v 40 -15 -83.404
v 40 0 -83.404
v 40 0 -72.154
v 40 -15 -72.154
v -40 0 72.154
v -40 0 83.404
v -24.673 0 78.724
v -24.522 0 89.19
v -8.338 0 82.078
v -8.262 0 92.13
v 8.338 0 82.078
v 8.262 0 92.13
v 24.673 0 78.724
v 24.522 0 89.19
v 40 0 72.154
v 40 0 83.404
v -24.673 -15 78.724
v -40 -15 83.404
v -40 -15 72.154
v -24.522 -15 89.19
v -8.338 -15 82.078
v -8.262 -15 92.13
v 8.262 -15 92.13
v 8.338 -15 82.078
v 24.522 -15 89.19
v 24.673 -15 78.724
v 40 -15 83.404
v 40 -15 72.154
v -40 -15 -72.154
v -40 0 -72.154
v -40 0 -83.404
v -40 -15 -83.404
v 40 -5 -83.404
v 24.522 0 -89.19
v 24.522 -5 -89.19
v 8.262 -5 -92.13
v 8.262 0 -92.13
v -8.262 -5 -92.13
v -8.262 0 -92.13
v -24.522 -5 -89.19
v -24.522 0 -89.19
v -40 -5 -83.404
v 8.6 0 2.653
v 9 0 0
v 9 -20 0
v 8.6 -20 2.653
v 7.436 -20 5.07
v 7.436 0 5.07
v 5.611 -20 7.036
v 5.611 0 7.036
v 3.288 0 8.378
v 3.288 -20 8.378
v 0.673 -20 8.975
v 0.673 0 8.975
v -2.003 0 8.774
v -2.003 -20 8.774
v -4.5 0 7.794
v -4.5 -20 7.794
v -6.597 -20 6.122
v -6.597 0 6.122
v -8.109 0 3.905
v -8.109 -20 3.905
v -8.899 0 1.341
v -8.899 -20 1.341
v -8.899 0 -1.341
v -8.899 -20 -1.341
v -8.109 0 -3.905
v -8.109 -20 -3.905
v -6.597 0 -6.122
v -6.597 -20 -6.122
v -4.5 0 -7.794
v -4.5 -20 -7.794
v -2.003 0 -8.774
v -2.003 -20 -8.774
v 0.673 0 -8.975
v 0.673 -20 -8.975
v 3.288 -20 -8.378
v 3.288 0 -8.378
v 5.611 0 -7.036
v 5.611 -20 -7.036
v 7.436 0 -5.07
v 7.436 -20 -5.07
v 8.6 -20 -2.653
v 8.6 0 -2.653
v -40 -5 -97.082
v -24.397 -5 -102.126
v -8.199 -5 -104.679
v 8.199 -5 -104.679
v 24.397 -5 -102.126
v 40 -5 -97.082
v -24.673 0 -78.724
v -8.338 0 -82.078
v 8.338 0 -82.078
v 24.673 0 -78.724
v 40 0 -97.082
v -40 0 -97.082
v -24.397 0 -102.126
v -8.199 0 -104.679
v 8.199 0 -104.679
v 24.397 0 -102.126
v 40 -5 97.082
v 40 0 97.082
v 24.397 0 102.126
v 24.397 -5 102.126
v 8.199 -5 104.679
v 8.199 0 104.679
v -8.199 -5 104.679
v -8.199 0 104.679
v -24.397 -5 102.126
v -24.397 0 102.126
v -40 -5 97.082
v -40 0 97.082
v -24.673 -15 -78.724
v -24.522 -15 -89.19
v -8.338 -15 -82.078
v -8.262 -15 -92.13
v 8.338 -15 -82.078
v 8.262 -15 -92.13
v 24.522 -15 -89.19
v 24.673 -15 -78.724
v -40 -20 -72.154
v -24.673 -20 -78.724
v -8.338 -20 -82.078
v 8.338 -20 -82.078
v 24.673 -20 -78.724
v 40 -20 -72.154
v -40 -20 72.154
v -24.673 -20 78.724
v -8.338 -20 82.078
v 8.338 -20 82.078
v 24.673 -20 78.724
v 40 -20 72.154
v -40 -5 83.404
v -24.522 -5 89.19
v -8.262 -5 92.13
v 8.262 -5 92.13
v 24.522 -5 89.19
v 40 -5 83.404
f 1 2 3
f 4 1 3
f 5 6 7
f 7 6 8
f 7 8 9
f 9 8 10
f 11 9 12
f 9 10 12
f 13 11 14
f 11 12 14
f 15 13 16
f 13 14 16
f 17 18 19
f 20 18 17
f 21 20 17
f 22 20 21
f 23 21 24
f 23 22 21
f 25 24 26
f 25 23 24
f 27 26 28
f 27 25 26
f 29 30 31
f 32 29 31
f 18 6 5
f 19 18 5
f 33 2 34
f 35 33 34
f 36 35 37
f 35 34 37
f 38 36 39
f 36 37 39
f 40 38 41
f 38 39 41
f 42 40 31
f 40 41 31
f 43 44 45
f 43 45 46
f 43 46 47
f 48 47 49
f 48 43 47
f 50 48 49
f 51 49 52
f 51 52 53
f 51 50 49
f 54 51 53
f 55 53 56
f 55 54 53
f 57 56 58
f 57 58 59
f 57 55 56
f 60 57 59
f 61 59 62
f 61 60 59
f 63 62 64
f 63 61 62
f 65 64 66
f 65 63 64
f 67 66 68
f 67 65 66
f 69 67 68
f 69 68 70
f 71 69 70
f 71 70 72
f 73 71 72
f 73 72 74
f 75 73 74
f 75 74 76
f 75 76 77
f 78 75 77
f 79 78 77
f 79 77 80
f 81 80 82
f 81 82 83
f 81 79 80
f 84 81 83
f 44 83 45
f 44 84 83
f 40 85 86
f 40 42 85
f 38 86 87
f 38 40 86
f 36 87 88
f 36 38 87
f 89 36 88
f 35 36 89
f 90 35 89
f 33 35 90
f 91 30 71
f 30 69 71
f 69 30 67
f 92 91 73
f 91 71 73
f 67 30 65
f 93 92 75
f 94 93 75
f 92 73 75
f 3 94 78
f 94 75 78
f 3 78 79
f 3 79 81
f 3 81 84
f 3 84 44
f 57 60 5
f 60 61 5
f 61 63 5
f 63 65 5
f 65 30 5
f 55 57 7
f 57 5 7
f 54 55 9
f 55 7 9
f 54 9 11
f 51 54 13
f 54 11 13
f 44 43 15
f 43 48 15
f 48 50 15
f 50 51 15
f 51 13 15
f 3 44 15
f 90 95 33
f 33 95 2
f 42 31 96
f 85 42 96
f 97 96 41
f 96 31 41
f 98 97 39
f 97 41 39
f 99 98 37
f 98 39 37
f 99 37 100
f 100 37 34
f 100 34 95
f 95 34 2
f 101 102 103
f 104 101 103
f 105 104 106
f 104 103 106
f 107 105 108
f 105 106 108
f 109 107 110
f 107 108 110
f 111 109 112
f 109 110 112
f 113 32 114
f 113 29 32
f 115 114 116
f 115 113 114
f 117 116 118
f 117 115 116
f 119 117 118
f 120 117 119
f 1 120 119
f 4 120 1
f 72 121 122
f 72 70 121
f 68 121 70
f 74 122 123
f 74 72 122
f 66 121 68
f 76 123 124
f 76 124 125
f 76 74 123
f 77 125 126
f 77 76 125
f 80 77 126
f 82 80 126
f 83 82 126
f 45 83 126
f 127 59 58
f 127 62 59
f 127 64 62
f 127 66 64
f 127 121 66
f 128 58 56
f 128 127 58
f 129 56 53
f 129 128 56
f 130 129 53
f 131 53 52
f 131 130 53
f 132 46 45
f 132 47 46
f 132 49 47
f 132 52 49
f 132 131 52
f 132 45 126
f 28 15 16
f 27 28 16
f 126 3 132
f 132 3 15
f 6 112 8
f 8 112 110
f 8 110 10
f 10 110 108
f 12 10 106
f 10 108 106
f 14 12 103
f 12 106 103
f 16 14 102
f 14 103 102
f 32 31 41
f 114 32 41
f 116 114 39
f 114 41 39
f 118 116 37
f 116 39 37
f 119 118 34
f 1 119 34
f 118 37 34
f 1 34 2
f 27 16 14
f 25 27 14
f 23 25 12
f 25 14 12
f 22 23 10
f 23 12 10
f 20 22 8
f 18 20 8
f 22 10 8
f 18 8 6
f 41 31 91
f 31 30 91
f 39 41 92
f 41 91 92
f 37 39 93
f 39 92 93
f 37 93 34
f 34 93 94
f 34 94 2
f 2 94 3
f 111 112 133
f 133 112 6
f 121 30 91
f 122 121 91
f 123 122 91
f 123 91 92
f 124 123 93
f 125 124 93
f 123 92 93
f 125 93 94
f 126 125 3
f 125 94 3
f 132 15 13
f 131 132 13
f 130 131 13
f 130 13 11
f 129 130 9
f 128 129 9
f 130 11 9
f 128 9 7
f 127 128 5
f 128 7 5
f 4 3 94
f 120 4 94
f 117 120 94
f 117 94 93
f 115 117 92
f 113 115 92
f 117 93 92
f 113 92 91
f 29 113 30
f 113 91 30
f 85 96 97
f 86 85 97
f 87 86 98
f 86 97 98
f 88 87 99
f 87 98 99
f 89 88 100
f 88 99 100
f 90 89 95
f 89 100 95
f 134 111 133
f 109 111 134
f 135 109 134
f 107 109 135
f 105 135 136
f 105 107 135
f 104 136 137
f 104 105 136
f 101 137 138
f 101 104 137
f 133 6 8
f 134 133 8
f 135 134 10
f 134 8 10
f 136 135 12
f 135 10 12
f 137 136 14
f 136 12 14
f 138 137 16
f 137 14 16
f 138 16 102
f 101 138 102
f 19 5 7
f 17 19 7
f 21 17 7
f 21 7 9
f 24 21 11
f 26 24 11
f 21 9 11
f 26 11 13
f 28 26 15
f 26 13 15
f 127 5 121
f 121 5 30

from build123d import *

# Parameters (mm, degrees)
F1_DEPTH = 5
F2_DEPTH = 15
F0_R     = 9
F3_DEPTH = 20


with BuildPart() as f1:
    # F0 (on Front) → F1 (new body)
    with BuildSketch(Plane.XZ):
        with BuildLine():
            Line((40, 83.4041365881), (40, 97.0824391947))
            ThreePointArc((40, 97.0824391947), (0, 105), (-40, 97.0824391947))
            Line((-40, 97.0824391947), (-40, 83.4041365881))
            ThreePointArc((-40, 83.4041365881), (0, 92.5), (40, 83.4041365881))
        make_face()
    extrude(amount=F1_DEPTH)


with BuildPart() as f1b:
    # F0 (on Front) → F1, piece 2 (new body)
    with BuildSketch(Plane.XZ):
        with BuildLine():
            ThreePointArc((-40, -97.0824391947), (0, -105), (40, -97.0824391947))
            Line((40, -97.0824391947), (40, -83.4041365881))
            ThreePointArc((40, -83.4041365881), (0, -92.5), (-40, -83.4041365881))
            Line((-40, -83.4041365881), (-40, -97.0824391947))
        make_face()
    extrude(amount=F1_DEPTH)


with BuildPart() as f2:
    # F0 (on Front) → F2 (new body)
    with BuildSketch(Plane.XZ):
        with BuildLine():
            Line((40, 72.1543484483), (40, 83.4041365881))
            ThreePointArc((40, 83.4041365881), (0, 92.5), (-40, 83.4041365881))
            Line((-40, 83.4041365881), (-40, 72.1543484483))
            ThreePointArc((-40, 72.1543484483), (0, 82.5), (40, 72.1543484483))
        make_face()
    extrude(amount=F2_DEPTH)


with BuildPart() as f2b:
    # F0 (on Front) → F2, piece 2 (new body)
    with BuildSketch(Plane.XZ):
        with BuildLine():
            ThreePointArc((-40, -83.4041365881), (0, -92.5), (40, -83.4041365881))
            Line((40, -83.4041365881), (40, -72.1543484483))
            ThreePointArc((40, -72.1543484483), (0, -82.5), (-40, -72.1543484483))
            Line((-40, -72.1543484483), (-40, -83.4041365881))
        make_face()
    extrude(amount=F2_DEPTH)


with BuildPart() as f3:
    # F0 (on Front) → F3 (new body)
    with BuildSketch(Plane.XZ):
        with BuildLine():
            Line((40, -72.1543484483), (40, 72.1543484483))
            ThreePointArc((40, 72.1543484483), (0, 82.5), (-40, 72.1543484483))
            Line((-40, 72.1543484483), (-40, -72.1543484483))
            ThreePointArc((-40, -72.1543484483), (0, -82.5), (40, -72.1543484483))
        make_face()
        Circle(F0_R, mode=Mode.SUBTRACT)
    extrude(amount=F3_DEPTH)


solid = Compound([f1.part, f1b.part, f2.part, f2b.part, f3.part])
